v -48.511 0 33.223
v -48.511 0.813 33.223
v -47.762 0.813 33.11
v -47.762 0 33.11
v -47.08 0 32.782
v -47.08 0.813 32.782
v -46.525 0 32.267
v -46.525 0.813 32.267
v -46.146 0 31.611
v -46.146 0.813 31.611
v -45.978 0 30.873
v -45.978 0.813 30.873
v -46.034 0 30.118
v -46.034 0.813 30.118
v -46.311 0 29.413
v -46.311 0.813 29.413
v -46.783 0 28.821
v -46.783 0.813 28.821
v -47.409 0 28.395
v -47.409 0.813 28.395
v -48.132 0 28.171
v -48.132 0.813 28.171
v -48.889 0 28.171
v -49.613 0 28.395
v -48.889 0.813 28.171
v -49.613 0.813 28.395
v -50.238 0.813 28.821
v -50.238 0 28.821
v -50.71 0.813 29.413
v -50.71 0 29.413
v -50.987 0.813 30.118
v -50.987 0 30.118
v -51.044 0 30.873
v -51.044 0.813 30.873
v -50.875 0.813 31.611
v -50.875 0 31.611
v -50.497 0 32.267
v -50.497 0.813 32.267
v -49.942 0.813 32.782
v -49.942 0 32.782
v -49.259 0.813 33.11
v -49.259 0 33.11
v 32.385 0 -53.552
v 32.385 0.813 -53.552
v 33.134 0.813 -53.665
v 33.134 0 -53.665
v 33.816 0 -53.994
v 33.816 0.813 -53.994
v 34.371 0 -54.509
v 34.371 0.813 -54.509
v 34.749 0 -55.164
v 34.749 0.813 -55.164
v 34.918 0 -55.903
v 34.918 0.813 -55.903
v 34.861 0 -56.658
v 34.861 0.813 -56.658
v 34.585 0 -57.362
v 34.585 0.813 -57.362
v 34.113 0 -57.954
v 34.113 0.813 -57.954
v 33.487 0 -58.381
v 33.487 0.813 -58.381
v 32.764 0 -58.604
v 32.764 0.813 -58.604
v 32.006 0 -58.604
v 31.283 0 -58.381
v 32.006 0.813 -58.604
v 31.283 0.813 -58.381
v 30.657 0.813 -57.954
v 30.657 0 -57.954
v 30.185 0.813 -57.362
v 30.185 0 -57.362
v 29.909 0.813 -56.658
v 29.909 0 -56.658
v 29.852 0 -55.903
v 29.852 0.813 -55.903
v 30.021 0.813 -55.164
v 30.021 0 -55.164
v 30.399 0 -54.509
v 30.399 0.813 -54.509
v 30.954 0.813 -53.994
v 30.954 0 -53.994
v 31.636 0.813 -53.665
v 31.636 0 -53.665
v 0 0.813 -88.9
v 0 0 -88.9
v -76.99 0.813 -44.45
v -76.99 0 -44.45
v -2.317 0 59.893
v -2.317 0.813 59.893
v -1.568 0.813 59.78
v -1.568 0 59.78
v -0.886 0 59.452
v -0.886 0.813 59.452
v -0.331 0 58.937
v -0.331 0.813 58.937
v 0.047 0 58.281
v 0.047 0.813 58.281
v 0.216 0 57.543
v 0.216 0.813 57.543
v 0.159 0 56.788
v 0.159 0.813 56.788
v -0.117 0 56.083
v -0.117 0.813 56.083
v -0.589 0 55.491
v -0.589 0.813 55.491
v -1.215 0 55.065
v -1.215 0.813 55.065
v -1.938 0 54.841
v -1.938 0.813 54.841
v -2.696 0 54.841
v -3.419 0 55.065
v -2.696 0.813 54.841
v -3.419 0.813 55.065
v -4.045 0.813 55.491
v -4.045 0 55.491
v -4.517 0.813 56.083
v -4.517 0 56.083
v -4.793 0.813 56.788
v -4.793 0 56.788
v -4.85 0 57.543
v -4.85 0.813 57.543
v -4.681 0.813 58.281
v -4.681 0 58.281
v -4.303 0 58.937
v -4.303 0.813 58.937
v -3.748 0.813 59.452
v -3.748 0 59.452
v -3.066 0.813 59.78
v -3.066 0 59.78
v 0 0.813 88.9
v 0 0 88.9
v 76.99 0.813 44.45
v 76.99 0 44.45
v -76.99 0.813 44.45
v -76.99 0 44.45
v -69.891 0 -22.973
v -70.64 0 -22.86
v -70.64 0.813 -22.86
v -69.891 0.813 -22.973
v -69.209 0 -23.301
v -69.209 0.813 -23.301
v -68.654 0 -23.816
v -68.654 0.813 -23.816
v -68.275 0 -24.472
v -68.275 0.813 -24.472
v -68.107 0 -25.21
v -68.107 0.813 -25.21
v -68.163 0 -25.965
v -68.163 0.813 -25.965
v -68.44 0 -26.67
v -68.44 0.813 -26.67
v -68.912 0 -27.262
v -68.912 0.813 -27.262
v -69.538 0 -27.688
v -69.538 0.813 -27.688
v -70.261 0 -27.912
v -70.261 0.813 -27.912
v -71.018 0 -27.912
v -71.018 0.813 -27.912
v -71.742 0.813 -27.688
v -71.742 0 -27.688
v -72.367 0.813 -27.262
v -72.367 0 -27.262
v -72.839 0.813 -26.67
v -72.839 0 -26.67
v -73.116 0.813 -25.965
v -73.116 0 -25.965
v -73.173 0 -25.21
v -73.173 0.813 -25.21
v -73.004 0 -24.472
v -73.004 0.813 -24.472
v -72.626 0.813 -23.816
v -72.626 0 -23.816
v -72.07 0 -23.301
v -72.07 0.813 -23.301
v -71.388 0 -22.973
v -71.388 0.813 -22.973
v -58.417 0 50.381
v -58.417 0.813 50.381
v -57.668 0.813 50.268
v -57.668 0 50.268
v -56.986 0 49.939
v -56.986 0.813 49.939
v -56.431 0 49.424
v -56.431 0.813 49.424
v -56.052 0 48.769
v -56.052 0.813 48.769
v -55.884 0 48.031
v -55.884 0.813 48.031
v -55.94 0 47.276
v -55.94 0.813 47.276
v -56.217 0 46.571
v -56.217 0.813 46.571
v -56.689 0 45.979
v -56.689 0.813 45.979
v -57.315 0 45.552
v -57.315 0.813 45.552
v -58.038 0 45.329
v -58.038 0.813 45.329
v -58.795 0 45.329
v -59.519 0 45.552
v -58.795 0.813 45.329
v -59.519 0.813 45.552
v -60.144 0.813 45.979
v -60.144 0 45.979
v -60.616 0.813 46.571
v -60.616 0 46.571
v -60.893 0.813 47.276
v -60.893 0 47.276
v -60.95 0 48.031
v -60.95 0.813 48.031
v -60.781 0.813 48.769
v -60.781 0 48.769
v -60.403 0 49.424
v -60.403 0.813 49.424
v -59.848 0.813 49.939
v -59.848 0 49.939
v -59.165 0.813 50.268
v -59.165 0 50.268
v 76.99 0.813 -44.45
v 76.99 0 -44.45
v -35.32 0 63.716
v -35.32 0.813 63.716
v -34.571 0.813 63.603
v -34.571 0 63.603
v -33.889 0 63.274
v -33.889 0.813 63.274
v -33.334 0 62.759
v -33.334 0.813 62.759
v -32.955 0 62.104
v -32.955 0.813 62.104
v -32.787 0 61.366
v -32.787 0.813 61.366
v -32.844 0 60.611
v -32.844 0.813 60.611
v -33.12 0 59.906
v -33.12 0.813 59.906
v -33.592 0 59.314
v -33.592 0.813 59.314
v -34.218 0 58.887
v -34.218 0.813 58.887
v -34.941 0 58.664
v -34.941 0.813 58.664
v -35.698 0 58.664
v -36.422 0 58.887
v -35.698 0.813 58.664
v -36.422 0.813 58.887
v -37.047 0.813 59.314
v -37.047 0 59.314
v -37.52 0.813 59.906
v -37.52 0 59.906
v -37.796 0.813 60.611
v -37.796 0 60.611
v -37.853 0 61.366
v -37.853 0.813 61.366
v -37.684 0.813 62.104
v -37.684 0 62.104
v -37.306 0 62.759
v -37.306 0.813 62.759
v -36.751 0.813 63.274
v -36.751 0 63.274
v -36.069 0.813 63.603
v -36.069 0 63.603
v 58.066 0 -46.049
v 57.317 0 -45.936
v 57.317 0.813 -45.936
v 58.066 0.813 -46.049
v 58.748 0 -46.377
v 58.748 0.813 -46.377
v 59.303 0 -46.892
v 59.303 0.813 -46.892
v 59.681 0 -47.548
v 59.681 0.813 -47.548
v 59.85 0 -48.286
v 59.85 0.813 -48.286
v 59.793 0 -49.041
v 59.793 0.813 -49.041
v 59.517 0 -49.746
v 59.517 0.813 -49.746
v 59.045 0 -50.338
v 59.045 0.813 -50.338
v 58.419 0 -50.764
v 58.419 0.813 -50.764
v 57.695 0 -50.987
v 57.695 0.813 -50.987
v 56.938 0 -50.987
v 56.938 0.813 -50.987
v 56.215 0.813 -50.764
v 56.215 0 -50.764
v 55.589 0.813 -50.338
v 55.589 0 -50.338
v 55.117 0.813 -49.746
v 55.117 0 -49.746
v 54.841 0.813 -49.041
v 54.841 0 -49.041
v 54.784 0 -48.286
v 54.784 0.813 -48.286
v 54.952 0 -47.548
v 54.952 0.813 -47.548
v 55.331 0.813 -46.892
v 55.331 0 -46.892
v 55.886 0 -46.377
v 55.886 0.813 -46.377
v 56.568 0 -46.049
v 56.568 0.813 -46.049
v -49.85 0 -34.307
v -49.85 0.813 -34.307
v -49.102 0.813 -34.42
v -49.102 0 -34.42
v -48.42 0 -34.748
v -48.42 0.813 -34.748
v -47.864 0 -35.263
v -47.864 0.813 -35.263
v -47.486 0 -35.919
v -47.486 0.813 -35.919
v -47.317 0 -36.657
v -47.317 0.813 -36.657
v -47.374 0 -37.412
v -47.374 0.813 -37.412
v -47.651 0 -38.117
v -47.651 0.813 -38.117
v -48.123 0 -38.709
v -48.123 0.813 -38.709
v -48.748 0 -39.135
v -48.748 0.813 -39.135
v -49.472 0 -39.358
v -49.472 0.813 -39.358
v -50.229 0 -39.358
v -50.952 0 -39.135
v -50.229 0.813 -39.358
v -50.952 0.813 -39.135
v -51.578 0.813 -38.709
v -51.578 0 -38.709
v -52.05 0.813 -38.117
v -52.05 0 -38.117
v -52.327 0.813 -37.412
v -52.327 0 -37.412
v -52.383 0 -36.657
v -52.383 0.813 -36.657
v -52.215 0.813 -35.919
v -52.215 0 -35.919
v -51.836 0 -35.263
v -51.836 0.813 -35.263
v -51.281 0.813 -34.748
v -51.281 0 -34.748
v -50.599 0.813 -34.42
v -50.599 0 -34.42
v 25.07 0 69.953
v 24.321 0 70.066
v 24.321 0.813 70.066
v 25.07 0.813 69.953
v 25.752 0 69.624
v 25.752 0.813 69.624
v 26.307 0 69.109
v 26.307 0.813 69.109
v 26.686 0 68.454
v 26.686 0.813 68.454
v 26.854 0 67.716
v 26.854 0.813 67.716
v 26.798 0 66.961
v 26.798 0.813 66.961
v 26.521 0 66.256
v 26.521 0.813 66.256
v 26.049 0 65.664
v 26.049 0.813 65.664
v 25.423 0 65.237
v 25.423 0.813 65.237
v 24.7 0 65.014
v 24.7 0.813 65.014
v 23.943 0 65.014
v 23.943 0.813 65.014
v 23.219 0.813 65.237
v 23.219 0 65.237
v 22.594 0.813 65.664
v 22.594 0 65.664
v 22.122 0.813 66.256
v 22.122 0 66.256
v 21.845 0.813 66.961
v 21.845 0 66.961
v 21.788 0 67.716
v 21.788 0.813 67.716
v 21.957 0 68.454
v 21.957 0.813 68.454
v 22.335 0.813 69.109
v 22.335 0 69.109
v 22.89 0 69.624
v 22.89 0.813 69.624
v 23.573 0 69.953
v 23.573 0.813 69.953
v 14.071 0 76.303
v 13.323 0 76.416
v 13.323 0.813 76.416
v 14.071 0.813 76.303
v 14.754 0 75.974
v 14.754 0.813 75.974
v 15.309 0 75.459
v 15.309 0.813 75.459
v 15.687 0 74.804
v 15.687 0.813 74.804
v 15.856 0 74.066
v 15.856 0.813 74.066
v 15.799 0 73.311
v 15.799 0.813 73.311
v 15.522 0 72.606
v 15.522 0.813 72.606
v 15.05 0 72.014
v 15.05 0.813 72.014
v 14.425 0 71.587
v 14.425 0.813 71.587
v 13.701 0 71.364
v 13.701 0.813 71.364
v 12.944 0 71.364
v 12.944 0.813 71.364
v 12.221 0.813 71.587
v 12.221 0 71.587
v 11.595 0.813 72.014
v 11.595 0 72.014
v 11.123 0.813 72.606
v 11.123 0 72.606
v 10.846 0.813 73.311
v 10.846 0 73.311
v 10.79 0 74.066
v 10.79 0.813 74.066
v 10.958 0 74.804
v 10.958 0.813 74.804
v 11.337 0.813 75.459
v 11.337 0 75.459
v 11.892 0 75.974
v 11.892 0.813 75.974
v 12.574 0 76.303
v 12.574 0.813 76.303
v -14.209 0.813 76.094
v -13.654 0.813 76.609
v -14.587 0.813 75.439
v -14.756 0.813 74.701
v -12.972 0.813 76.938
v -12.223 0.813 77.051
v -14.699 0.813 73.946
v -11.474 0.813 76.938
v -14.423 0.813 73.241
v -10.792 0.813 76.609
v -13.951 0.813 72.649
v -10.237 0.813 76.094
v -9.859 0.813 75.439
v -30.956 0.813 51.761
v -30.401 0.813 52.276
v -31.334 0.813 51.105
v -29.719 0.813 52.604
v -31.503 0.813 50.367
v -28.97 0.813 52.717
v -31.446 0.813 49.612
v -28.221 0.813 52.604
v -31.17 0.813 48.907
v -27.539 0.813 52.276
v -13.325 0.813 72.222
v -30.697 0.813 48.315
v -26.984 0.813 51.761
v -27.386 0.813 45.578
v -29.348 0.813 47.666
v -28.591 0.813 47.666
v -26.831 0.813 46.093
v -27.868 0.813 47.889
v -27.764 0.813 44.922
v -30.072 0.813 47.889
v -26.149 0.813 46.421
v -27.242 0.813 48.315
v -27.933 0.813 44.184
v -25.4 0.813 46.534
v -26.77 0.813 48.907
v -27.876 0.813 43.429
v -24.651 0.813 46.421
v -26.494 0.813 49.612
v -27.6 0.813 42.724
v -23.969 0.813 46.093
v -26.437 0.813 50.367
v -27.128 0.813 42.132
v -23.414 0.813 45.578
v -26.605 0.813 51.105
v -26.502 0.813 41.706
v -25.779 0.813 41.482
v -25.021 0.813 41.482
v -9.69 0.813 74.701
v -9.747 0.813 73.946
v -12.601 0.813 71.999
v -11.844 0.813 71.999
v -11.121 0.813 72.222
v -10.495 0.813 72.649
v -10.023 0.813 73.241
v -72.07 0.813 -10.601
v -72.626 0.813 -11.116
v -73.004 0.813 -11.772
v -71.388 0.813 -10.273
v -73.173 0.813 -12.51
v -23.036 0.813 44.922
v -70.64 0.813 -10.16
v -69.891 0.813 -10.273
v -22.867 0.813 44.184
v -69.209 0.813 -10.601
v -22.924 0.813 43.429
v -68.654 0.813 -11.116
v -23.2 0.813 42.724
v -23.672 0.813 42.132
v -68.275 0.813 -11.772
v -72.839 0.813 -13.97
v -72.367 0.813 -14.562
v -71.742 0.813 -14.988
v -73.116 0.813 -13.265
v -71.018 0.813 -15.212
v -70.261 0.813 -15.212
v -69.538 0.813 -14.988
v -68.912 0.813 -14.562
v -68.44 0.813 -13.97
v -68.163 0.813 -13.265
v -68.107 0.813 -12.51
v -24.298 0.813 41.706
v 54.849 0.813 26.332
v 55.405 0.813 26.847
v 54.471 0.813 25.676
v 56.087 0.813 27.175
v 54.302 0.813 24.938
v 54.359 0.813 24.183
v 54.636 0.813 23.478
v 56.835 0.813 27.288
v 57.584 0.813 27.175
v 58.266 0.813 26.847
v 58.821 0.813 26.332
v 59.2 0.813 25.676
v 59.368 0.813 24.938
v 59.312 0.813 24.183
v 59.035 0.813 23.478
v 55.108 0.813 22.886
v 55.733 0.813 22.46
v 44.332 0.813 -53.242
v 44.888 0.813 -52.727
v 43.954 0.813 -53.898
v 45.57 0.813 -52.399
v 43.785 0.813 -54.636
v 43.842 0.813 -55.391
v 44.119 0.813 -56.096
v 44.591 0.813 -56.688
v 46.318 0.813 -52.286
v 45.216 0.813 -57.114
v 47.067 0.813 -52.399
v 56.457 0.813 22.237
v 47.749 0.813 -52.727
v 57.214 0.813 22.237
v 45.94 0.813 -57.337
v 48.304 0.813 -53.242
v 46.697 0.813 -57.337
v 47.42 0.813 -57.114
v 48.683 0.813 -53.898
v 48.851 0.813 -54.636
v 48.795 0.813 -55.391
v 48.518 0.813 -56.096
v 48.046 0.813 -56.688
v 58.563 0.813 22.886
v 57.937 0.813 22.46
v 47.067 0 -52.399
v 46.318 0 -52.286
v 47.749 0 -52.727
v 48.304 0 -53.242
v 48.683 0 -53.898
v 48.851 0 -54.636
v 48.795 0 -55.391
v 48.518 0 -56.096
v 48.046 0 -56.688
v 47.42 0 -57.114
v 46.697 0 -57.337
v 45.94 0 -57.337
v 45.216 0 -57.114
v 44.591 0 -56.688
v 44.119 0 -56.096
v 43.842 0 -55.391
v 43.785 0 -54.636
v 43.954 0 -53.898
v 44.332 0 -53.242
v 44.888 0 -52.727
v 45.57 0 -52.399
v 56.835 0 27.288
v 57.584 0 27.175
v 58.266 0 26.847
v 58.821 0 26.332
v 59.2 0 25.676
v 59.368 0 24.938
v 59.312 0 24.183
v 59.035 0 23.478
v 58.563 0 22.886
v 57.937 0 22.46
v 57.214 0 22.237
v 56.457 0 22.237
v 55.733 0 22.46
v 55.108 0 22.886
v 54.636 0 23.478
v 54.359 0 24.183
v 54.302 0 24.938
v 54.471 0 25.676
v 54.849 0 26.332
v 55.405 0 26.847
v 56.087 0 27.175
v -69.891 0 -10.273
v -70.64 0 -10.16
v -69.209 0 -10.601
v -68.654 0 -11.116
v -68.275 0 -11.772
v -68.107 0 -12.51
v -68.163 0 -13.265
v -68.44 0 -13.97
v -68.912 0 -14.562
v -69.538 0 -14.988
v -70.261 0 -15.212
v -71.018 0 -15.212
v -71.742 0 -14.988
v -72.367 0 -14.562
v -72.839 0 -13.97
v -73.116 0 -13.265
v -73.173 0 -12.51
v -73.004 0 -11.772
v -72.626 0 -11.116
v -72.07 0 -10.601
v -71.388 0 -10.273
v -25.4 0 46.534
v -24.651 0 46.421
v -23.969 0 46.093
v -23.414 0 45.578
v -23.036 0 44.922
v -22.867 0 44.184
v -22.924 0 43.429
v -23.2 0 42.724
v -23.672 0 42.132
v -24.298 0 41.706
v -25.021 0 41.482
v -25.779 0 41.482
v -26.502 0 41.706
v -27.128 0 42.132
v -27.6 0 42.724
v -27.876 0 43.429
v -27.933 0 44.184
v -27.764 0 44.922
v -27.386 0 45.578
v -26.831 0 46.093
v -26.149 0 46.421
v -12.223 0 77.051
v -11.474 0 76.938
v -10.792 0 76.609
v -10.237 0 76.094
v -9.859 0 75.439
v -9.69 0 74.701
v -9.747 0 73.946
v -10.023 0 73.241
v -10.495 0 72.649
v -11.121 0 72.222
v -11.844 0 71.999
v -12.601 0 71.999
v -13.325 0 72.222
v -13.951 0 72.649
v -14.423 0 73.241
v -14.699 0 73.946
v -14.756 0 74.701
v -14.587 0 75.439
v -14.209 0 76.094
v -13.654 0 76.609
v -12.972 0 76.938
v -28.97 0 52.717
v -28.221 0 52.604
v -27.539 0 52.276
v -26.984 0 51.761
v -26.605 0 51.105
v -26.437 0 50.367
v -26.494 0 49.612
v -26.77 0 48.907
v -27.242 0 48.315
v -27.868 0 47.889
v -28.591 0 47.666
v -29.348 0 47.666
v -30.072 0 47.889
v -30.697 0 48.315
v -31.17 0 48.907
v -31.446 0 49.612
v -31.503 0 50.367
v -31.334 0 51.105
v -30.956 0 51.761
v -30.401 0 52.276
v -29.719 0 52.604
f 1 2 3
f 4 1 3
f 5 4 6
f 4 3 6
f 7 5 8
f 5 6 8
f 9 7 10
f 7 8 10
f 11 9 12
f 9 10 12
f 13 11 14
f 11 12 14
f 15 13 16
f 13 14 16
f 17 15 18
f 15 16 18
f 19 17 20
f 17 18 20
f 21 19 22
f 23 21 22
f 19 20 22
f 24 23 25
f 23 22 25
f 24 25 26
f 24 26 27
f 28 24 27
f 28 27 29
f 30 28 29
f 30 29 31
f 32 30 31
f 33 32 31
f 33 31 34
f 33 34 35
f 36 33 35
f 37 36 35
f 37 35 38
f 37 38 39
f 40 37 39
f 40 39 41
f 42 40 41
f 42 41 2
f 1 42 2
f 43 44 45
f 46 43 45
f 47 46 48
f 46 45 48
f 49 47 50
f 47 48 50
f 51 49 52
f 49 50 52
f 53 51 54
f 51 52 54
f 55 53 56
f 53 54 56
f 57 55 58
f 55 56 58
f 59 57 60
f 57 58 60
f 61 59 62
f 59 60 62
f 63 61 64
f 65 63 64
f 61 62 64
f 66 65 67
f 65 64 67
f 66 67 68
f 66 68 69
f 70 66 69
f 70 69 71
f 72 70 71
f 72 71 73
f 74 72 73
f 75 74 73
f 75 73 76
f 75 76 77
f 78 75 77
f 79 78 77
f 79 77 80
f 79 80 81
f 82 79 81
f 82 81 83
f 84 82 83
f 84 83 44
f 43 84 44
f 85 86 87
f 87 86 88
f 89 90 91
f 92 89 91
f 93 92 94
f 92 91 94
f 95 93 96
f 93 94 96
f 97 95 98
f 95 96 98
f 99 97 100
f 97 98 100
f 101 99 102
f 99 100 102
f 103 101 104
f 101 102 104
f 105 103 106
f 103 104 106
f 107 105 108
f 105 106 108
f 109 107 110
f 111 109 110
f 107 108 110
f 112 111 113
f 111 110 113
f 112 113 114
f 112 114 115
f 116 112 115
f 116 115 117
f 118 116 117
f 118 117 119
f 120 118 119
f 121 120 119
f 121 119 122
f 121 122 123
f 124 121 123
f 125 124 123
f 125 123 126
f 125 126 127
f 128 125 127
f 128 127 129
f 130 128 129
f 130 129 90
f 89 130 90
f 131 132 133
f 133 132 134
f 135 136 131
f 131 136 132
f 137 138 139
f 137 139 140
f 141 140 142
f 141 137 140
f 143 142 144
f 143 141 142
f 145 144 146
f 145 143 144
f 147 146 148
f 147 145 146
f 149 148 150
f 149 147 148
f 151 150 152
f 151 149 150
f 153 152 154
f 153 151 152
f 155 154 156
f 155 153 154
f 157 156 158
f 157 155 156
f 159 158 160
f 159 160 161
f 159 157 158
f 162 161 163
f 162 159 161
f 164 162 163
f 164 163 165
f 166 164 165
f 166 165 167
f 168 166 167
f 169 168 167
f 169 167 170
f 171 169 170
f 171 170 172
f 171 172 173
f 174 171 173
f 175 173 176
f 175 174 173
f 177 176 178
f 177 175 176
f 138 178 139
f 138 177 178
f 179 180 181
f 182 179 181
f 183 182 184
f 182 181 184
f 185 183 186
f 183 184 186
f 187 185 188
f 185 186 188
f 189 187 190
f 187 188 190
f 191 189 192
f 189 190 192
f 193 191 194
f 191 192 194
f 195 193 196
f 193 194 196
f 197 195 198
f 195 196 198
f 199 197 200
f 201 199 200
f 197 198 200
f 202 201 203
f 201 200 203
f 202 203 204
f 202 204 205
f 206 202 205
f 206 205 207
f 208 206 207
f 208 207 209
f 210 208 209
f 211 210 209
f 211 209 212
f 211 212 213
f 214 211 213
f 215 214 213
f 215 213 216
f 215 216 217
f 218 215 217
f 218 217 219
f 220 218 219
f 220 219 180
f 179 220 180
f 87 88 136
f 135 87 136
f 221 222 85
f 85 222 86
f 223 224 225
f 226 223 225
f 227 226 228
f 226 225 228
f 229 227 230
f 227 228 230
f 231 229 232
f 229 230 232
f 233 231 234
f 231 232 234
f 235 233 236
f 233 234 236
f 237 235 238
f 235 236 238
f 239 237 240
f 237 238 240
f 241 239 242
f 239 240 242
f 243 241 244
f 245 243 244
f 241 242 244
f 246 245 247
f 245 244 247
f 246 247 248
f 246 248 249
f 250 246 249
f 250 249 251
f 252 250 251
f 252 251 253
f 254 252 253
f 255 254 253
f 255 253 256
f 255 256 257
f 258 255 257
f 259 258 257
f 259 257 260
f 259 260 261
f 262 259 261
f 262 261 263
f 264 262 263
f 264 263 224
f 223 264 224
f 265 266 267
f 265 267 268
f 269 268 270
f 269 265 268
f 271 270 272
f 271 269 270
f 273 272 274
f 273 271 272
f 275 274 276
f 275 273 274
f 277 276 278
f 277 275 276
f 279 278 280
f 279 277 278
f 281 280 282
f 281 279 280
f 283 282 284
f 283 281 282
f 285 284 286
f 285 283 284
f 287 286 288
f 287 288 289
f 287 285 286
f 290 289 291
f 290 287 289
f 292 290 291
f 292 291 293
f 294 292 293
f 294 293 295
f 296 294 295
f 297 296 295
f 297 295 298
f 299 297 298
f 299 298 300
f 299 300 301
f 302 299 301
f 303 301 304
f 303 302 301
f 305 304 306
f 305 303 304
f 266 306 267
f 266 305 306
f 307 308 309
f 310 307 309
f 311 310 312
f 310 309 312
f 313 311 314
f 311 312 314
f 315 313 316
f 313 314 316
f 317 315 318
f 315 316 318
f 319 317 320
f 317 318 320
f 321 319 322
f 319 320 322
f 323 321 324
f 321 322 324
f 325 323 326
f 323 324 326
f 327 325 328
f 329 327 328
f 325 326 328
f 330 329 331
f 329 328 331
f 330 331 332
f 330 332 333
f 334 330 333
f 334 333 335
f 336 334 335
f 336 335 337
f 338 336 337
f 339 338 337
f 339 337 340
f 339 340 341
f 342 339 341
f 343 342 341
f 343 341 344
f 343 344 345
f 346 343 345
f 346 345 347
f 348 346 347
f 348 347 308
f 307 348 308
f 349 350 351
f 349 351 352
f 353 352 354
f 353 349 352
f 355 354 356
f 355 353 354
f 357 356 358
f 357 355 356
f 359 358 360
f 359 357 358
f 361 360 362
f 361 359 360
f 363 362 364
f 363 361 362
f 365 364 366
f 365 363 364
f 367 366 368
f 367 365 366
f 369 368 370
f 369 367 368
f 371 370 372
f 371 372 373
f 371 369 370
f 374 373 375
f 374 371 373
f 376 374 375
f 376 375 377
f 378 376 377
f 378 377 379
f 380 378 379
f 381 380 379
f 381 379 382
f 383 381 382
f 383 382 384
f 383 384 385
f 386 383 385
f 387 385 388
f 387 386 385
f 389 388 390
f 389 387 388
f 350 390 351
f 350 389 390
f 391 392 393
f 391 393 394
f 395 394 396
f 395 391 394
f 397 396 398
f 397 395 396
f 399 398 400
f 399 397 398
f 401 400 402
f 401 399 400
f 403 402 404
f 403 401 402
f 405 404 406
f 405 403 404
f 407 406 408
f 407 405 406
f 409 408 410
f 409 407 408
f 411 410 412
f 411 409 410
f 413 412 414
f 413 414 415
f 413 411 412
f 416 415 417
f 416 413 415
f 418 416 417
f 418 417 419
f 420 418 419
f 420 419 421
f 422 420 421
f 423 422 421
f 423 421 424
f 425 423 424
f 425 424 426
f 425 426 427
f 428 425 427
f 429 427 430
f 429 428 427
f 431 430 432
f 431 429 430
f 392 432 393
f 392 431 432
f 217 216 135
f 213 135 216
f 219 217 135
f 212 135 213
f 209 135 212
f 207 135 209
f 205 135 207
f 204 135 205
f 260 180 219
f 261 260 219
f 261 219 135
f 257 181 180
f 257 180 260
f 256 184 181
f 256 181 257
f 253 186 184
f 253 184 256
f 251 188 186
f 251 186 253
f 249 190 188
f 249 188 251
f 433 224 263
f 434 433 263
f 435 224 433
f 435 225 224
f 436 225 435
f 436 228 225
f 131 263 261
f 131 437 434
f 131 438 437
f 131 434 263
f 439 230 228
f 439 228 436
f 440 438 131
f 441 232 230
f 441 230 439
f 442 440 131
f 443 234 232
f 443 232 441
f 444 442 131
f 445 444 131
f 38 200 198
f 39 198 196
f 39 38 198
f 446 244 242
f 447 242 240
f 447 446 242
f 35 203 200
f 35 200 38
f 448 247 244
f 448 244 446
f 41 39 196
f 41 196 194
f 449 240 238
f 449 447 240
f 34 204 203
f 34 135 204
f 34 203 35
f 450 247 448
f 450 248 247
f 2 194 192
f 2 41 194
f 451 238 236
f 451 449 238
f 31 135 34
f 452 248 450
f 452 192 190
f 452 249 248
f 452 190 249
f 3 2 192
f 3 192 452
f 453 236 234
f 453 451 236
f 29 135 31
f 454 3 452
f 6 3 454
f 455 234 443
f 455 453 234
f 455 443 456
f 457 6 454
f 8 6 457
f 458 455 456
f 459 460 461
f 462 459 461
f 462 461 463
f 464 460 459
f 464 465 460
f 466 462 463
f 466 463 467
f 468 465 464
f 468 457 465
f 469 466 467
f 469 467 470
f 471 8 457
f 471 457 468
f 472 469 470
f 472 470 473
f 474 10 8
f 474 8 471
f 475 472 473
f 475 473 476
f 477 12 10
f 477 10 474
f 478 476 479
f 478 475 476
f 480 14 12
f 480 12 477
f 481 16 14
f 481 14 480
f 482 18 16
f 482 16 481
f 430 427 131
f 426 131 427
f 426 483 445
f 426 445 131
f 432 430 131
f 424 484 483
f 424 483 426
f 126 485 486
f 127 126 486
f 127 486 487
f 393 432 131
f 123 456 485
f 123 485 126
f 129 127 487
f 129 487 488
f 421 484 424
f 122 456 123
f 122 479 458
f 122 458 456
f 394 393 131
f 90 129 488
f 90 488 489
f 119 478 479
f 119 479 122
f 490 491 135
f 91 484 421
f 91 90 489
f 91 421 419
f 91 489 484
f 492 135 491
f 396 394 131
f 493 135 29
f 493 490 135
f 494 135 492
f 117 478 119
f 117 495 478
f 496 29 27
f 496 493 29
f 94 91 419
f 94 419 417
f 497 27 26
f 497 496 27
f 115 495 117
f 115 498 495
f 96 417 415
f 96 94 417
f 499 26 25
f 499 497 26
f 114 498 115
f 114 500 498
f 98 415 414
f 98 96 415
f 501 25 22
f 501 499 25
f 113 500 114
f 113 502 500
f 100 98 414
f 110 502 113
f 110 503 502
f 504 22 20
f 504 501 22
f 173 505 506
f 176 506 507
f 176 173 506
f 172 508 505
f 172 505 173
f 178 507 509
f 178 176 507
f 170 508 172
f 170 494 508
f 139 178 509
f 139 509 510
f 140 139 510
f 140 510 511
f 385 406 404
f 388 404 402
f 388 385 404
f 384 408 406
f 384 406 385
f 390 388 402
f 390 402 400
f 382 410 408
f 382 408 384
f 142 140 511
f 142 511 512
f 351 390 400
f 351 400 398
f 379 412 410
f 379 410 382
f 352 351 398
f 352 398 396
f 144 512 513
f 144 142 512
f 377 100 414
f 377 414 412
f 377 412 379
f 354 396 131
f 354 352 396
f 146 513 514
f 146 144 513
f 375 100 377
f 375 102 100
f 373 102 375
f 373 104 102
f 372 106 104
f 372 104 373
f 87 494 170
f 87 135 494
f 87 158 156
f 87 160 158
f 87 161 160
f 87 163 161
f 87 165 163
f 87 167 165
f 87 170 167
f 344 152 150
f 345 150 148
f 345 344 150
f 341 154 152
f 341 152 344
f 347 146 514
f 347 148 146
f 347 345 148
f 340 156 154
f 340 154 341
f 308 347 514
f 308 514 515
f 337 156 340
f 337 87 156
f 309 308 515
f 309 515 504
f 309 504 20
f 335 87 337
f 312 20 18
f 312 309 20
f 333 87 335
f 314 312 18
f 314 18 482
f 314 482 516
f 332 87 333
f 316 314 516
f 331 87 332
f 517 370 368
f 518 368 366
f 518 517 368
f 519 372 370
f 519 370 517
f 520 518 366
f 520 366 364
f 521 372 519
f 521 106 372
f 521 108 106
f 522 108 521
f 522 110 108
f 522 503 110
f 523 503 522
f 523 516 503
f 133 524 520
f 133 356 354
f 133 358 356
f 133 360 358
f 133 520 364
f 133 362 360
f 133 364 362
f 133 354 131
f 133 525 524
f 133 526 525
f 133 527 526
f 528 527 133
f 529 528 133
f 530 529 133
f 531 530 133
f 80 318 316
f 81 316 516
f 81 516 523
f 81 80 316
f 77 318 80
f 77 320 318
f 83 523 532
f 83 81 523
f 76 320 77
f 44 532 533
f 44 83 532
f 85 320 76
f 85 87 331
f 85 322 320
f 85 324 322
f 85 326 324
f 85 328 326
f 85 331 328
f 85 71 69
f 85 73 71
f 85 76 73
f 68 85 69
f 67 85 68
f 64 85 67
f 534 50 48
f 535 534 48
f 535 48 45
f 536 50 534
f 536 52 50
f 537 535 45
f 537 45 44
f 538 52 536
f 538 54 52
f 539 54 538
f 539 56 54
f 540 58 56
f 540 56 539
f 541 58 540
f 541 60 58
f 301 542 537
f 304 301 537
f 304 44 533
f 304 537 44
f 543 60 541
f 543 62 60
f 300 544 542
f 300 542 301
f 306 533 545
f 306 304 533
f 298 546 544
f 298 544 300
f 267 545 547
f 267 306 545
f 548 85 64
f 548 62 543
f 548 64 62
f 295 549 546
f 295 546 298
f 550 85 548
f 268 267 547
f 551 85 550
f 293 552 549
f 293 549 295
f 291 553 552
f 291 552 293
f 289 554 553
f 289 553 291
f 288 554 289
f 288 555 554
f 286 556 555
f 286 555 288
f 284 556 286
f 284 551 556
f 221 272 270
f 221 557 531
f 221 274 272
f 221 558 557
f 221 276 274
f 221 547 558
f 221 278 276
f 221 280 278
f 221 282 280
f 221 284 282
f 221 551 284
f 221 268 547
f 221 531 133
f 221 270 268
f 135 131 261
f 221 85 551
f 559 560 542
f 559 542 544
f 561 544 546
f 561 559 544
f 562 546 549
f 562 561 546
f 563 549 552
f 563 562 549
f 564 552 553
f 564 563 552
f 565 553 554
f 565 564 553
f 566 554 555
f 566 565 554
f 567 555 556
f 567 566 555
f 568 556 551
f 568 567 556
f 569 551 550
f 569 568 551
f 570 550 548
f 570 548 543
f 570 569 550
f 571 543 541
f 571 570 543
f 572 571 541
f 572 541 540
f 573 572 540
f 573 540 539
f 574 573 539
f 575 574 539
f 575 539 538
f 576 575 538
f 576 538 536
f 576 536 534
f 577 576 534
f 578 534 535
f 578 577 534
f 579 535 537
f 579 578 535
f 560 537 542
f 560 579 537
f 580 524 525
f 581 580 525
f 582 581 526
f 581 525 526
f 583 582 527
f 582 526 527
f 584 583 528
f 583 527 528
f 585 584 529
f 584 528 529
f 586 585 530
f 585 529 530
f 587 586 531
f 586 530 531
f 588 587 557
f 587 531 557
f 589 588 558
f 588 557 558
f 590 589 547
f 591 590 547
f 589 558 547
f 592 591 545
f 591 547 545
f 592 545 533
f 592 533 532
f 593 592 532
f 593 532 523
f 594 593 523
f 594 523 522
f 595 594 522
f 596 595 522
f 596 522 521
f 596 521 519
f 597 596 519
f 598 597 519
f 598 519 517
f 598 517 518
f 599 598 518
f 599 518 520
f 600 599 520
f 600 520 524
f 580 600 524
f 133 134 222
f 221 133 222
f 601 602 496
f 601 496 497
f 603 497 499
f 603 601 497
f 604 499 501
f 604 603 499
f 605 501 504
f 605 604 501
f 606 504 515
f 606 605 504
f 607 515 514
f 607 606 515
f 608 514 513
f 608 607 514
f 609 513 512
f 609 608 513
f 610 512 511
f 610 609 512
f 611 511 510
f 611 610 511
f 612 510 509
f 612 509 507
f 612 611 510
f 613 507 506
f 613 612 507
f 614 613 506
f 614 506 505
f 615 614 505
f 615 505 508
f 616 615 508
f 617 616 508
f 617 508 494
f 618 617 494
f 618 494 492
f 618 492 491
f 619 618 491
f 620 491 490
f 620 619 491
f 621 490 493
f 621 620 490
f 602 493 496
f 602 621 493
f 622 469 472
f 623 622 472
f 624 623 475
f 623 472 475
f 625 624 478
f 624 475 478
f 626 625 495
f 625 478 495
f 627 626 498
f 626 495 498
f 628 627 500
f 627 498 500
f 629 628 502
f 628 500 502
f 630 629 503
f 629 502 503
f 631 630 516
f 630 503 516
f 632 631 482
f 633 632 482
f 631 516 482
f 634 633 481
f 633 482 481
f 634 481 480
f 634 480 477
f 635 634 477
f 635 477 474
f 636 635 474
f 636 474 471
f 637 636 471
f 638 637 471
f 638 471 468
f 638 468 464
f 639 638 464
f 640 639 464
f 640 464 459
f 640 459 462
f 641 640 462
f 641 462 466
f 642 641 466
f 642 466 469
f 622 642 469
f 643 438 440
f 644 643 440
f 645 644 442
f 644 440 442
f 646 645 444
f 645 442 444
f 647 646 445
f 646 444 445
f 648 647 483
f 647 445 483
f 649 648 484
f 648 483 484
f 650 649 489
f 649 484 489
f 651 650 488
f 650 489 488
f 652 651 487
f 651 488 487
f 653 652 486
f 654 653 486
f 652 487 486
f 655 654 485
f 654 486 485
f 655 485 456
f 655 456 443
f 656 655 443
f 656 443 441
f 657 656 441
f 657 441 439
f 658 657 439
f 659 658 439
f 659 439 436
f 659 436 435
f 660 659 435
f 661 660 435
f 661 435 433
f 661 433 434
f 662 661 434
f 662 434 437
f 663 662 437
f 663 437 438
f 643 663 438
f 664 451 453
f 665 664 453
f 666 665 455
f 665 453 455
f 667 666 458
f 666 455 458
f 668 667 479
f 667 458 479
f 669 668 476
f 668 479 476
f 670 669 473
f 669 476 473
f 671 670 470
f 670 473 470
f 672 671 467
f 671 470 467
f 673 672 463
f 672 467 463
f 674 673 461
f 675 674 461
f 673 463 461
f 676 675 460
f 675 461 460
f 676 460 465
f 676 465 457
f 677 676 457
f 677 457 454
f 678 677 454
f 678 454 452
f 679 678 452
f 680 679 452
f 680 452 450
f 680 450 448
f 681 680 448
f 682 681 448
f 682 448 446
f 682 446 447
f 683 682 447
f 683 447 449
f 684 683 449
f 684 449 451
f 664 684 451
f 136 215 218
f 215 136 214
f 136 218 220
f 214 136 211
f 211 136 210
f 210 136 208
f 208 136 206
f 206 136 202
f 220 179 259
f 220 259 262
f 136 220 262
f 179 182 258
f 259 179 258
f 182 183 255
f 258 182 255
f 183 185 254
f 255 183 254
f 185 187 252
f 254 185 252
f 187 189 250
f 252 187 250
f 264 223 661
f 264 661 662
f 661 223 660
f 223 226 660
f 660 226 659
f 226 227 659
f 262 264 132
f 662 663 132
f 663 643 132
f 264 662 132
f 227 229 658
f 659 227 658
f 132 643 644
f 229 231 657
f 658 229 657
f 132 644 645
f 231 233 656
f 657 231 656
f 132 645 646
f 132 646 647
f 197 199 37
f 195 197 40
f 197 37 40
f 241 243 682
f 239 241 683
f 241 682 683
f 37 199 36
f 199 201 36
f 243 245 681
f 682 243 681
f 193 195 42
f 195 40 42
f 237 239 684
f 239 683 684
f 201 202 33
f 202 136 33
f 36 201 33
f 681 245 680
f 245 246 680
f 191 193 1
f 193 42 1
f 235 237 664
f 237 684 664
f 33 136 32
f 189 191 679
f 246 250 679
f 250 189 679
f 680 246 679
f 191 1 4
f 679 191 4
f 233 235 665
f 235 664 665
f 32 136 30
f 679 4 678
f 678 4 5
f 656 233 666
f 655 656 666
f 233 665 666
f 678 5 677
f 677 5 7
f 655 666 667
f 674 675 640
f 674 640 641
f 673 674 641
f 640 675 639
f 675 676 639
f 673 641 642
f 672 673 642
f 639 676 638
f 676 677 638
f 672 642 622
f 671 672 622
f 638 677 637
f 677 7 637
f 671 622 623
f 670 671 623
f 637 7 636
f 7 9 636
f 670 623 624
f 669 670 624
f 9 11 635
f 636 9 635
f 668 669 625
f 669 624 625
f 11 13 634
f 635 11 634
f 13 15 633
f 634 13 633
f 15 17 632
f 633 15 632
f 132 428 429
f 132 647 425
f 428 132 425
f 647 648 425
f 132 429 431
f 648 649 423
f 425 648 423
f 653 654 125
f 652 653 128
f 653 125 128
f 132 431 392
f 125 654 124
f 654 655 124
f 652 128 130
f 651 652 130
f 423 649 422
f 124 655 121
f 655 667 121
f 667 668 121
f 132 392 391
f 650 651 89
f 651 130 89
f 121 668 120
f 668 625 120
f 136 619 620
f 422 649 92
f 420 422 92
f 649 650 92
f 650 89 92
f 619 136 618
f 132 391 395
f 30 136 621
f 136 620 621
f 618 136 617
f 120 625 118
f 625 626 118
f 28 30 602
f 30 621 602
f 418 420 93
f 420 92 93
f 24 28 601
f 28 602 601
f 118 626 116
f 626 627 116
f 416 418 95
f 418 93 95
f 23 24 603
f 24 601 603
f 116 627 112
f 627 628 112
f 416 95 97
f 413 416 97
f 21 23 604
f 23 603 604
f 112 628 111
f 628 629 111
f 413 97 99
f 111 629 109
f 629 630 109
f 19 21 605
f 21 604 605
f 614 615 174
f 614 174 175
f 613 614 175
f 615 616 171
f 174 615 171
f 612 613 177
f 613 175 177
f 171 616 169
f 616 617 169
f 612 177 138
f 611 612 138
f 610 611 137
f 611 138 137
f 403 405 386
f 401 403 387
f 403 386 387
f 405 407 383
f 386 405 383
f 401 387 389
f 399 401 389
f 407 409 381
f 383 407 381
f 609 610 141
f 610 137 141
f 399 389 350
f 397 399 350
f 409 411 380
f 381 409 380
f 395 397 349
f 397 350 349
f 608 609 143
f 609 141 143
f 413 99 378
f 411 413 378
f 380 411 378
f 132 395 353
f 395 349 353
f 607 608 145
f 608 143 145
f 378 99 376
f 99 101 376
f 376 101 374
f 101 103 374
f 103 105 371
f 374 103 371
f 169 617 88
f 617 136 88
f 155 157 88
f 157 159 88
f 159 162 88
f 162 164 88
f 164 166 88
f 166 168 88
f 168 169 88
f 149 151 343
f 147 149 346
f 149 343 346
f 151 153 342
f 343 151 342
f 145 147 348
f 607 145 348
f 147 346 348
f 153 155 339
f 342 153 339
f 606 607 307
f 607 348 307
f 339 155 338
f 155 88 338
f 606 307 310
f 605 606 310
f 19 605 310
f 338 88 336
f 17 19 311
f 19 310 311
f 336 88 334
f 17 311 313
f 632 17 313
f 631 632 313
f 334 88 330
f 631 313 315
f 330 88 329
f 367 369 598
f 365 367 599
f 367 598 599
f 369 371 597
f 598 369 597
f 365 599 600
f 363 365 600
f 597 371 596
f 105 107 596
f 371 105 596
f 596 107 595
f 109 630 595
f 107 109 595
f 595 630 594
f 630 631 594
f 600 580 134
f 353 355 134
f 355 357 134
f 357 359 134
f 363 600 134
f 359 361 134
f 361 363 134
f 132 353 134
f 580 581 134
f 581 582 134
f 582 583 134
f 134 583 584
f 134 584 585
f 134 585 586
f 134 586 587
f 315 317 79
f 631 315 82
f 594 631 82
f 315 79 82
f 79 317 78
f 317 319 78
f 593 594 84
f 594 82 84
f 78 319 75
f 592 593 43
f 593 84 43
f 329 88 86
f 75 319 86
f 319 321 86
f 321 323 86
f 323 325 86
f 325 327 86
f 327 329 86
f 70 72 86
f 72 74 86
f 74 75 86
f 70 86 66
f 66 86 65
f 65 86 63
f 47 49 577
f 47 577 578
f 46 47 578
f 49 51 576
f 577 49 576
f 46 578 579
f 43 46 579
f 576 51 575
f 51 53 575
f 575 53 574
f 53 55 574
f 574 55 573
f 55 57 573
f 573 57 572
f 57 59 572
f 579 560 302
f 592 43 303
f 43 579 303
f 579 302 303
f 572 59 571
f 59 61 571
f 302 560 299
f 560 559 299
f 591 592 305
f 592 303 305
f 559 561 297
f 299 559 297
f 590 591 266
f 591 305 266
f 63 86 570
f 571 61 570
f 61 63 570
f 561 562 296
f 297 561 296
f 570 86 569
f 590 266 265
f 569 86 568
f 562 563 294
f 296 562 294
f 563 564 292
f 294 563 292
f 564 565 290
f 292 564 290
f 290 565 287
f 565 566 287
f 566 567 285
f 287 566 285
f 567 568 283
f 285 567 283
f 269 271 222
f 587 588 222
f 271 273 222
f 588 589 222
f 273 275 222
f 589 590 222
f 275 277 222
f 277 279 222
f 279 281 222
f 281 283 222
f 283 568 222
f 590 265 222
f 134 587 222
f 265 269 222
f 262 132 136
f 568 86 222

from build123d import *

# Parameters (mm, degrees)
SKETCH1_R           = 2.54
BOSS_EXTRUDE1_DEPTH = 0.8128
SKETCH2_R           = 2.54
CUT_EXTRUDE1_DEPTH  = 118.606454516
SKETCH3_R           = 2.54
CUT_EXTRUDE2_DEPTH  = 118.606454516
SKETCH5_R           = 2.54
CUT_EXTRUDE3_DEPTH  = 2.54


with BuildPart() as part:
    # Sketch1 → Boss-Extrude1 (new body)
    with BuildSketch(Plane(origin=(0, 0, 0), x_dir=(1, 0, 0), z_dir=(0, 1, 0))):
        Polygon((0, 88.9), (-76.989658396, 44.45), (-76.989658396, -44.45), (0, -88.9), (76.989658396, -44.45), (76.989658396, 44.45), align=None)
        with Locations(Location((13.322783942, -73.875738686, 0), (0, 0, 270))):
            Circle(SKETCH1_R, mode=Mode.SUBTRACT)
        with Locations(Location((24.32130657, -67.525738686, 0), (0, 0, 270))):
            Circle(SKETCH1_R, mode=Mode.SUBTRACT)
        with Locations(Location((-70.639658396, 12.7, 0), (0, 0, 270))):
            Circle(SKETCH1_R, mode=Mode.SUBTRACT)
        with Locations(Location((-70.639658396, 25.4, 0), (0, 0, 270))):
            Circle(SKETCH1_R, mode=Mode.SUBTRACT)
        with Locations(Location((46.318351826, 54.825738686, 0), (0, 0, 270))):
            Circle(SKETCH1_R, mode=Mode.SUBTRACT)
        with Locations(Location((57.316874454, 48.475738686, 0), (0, 0, 270))):
            Circle(SKETCH1_R, mode=Mode.SUBTRACT)
    extrude(amount=BOSS_EXTRUDE1_DEPTH)

    # Sketch2 → Cut-Extrude1 (cut, through all)
    with BuildSketch(Plane(origin=(0, 0.8128, 0), x_dir=(1, 0, 0), z_dir=(0, 1, 0))):
        with Locations(Location((-49.850334746, 36.846687445, 0), (0, 0, 270))):
            Circle(SKETCH2_R)
        with Locations(Location((-25.4, -43.994090512, 0), (0, 0, 270))):
            Circle(SKETCH2_R)
        with Locations(Location((32.385, 56.092465403, 0), (0, 0, 270))):
            Circle(SKETCH2_R)
        with Locations(Location((56.835334746, -24.748312555, 0), (0, 0, 270))):
            Circle(SKETCH2_R)
    extrude(amount=-CUT_EXTRUDE1_DEPTH, mode=Mode.SUBTRACT)

    # Sketch3 → Cut-Extrude2 (cut, through all)
    with BuildSketch(Plane(origin=(0, 0.8128, 0), x_dir=(1, 0, 0), z_dir=(0, 1, 0))):
        with Locations(Location((-35.319829198, -61.175738686, 0), (0, 0, 270))):
            Circle(SKETCH3_R)
        with Locations(Location((-28.969829198, -50.177216058, 0), (0, 0, 270))):
            Circle(SKETCH3_R)
    extrude(amount=-CUT_EXTRUDE2_DEPTH, mode=Mode.SUBTRACT)

    # Sketch5 → Cut-Extrude3 (cut)
    with BuildSketch(Plane(origin=(0, 0.8128, 0), x_dir=(1, 0, 0), z_dir=(0, 1, 0))):
        with Locations(Location((-2.3169441, -57.353036215, 0), (0, 0, 270))):
            Circle(SKETCH5_R)
        with Locations(Location((-12.222931679, -74.510738686, 0), (0, 0, 270))):
            Circle(SKETCH5_R)
        with Locations(Location((-58.416726717, -47.840738686, 0), (0, 0, 270))):
            Circle(SKETCH5_R)
        with Locations(Location((-48.510714297, -30.683050557, 0), (0, 0, 270))):
            Circle(SKETCH5_R)
    extrude(amount=-CUT_EXTRUDE3_DEPTH, mode=Mode.SUBTRACT)


solid = part.part
